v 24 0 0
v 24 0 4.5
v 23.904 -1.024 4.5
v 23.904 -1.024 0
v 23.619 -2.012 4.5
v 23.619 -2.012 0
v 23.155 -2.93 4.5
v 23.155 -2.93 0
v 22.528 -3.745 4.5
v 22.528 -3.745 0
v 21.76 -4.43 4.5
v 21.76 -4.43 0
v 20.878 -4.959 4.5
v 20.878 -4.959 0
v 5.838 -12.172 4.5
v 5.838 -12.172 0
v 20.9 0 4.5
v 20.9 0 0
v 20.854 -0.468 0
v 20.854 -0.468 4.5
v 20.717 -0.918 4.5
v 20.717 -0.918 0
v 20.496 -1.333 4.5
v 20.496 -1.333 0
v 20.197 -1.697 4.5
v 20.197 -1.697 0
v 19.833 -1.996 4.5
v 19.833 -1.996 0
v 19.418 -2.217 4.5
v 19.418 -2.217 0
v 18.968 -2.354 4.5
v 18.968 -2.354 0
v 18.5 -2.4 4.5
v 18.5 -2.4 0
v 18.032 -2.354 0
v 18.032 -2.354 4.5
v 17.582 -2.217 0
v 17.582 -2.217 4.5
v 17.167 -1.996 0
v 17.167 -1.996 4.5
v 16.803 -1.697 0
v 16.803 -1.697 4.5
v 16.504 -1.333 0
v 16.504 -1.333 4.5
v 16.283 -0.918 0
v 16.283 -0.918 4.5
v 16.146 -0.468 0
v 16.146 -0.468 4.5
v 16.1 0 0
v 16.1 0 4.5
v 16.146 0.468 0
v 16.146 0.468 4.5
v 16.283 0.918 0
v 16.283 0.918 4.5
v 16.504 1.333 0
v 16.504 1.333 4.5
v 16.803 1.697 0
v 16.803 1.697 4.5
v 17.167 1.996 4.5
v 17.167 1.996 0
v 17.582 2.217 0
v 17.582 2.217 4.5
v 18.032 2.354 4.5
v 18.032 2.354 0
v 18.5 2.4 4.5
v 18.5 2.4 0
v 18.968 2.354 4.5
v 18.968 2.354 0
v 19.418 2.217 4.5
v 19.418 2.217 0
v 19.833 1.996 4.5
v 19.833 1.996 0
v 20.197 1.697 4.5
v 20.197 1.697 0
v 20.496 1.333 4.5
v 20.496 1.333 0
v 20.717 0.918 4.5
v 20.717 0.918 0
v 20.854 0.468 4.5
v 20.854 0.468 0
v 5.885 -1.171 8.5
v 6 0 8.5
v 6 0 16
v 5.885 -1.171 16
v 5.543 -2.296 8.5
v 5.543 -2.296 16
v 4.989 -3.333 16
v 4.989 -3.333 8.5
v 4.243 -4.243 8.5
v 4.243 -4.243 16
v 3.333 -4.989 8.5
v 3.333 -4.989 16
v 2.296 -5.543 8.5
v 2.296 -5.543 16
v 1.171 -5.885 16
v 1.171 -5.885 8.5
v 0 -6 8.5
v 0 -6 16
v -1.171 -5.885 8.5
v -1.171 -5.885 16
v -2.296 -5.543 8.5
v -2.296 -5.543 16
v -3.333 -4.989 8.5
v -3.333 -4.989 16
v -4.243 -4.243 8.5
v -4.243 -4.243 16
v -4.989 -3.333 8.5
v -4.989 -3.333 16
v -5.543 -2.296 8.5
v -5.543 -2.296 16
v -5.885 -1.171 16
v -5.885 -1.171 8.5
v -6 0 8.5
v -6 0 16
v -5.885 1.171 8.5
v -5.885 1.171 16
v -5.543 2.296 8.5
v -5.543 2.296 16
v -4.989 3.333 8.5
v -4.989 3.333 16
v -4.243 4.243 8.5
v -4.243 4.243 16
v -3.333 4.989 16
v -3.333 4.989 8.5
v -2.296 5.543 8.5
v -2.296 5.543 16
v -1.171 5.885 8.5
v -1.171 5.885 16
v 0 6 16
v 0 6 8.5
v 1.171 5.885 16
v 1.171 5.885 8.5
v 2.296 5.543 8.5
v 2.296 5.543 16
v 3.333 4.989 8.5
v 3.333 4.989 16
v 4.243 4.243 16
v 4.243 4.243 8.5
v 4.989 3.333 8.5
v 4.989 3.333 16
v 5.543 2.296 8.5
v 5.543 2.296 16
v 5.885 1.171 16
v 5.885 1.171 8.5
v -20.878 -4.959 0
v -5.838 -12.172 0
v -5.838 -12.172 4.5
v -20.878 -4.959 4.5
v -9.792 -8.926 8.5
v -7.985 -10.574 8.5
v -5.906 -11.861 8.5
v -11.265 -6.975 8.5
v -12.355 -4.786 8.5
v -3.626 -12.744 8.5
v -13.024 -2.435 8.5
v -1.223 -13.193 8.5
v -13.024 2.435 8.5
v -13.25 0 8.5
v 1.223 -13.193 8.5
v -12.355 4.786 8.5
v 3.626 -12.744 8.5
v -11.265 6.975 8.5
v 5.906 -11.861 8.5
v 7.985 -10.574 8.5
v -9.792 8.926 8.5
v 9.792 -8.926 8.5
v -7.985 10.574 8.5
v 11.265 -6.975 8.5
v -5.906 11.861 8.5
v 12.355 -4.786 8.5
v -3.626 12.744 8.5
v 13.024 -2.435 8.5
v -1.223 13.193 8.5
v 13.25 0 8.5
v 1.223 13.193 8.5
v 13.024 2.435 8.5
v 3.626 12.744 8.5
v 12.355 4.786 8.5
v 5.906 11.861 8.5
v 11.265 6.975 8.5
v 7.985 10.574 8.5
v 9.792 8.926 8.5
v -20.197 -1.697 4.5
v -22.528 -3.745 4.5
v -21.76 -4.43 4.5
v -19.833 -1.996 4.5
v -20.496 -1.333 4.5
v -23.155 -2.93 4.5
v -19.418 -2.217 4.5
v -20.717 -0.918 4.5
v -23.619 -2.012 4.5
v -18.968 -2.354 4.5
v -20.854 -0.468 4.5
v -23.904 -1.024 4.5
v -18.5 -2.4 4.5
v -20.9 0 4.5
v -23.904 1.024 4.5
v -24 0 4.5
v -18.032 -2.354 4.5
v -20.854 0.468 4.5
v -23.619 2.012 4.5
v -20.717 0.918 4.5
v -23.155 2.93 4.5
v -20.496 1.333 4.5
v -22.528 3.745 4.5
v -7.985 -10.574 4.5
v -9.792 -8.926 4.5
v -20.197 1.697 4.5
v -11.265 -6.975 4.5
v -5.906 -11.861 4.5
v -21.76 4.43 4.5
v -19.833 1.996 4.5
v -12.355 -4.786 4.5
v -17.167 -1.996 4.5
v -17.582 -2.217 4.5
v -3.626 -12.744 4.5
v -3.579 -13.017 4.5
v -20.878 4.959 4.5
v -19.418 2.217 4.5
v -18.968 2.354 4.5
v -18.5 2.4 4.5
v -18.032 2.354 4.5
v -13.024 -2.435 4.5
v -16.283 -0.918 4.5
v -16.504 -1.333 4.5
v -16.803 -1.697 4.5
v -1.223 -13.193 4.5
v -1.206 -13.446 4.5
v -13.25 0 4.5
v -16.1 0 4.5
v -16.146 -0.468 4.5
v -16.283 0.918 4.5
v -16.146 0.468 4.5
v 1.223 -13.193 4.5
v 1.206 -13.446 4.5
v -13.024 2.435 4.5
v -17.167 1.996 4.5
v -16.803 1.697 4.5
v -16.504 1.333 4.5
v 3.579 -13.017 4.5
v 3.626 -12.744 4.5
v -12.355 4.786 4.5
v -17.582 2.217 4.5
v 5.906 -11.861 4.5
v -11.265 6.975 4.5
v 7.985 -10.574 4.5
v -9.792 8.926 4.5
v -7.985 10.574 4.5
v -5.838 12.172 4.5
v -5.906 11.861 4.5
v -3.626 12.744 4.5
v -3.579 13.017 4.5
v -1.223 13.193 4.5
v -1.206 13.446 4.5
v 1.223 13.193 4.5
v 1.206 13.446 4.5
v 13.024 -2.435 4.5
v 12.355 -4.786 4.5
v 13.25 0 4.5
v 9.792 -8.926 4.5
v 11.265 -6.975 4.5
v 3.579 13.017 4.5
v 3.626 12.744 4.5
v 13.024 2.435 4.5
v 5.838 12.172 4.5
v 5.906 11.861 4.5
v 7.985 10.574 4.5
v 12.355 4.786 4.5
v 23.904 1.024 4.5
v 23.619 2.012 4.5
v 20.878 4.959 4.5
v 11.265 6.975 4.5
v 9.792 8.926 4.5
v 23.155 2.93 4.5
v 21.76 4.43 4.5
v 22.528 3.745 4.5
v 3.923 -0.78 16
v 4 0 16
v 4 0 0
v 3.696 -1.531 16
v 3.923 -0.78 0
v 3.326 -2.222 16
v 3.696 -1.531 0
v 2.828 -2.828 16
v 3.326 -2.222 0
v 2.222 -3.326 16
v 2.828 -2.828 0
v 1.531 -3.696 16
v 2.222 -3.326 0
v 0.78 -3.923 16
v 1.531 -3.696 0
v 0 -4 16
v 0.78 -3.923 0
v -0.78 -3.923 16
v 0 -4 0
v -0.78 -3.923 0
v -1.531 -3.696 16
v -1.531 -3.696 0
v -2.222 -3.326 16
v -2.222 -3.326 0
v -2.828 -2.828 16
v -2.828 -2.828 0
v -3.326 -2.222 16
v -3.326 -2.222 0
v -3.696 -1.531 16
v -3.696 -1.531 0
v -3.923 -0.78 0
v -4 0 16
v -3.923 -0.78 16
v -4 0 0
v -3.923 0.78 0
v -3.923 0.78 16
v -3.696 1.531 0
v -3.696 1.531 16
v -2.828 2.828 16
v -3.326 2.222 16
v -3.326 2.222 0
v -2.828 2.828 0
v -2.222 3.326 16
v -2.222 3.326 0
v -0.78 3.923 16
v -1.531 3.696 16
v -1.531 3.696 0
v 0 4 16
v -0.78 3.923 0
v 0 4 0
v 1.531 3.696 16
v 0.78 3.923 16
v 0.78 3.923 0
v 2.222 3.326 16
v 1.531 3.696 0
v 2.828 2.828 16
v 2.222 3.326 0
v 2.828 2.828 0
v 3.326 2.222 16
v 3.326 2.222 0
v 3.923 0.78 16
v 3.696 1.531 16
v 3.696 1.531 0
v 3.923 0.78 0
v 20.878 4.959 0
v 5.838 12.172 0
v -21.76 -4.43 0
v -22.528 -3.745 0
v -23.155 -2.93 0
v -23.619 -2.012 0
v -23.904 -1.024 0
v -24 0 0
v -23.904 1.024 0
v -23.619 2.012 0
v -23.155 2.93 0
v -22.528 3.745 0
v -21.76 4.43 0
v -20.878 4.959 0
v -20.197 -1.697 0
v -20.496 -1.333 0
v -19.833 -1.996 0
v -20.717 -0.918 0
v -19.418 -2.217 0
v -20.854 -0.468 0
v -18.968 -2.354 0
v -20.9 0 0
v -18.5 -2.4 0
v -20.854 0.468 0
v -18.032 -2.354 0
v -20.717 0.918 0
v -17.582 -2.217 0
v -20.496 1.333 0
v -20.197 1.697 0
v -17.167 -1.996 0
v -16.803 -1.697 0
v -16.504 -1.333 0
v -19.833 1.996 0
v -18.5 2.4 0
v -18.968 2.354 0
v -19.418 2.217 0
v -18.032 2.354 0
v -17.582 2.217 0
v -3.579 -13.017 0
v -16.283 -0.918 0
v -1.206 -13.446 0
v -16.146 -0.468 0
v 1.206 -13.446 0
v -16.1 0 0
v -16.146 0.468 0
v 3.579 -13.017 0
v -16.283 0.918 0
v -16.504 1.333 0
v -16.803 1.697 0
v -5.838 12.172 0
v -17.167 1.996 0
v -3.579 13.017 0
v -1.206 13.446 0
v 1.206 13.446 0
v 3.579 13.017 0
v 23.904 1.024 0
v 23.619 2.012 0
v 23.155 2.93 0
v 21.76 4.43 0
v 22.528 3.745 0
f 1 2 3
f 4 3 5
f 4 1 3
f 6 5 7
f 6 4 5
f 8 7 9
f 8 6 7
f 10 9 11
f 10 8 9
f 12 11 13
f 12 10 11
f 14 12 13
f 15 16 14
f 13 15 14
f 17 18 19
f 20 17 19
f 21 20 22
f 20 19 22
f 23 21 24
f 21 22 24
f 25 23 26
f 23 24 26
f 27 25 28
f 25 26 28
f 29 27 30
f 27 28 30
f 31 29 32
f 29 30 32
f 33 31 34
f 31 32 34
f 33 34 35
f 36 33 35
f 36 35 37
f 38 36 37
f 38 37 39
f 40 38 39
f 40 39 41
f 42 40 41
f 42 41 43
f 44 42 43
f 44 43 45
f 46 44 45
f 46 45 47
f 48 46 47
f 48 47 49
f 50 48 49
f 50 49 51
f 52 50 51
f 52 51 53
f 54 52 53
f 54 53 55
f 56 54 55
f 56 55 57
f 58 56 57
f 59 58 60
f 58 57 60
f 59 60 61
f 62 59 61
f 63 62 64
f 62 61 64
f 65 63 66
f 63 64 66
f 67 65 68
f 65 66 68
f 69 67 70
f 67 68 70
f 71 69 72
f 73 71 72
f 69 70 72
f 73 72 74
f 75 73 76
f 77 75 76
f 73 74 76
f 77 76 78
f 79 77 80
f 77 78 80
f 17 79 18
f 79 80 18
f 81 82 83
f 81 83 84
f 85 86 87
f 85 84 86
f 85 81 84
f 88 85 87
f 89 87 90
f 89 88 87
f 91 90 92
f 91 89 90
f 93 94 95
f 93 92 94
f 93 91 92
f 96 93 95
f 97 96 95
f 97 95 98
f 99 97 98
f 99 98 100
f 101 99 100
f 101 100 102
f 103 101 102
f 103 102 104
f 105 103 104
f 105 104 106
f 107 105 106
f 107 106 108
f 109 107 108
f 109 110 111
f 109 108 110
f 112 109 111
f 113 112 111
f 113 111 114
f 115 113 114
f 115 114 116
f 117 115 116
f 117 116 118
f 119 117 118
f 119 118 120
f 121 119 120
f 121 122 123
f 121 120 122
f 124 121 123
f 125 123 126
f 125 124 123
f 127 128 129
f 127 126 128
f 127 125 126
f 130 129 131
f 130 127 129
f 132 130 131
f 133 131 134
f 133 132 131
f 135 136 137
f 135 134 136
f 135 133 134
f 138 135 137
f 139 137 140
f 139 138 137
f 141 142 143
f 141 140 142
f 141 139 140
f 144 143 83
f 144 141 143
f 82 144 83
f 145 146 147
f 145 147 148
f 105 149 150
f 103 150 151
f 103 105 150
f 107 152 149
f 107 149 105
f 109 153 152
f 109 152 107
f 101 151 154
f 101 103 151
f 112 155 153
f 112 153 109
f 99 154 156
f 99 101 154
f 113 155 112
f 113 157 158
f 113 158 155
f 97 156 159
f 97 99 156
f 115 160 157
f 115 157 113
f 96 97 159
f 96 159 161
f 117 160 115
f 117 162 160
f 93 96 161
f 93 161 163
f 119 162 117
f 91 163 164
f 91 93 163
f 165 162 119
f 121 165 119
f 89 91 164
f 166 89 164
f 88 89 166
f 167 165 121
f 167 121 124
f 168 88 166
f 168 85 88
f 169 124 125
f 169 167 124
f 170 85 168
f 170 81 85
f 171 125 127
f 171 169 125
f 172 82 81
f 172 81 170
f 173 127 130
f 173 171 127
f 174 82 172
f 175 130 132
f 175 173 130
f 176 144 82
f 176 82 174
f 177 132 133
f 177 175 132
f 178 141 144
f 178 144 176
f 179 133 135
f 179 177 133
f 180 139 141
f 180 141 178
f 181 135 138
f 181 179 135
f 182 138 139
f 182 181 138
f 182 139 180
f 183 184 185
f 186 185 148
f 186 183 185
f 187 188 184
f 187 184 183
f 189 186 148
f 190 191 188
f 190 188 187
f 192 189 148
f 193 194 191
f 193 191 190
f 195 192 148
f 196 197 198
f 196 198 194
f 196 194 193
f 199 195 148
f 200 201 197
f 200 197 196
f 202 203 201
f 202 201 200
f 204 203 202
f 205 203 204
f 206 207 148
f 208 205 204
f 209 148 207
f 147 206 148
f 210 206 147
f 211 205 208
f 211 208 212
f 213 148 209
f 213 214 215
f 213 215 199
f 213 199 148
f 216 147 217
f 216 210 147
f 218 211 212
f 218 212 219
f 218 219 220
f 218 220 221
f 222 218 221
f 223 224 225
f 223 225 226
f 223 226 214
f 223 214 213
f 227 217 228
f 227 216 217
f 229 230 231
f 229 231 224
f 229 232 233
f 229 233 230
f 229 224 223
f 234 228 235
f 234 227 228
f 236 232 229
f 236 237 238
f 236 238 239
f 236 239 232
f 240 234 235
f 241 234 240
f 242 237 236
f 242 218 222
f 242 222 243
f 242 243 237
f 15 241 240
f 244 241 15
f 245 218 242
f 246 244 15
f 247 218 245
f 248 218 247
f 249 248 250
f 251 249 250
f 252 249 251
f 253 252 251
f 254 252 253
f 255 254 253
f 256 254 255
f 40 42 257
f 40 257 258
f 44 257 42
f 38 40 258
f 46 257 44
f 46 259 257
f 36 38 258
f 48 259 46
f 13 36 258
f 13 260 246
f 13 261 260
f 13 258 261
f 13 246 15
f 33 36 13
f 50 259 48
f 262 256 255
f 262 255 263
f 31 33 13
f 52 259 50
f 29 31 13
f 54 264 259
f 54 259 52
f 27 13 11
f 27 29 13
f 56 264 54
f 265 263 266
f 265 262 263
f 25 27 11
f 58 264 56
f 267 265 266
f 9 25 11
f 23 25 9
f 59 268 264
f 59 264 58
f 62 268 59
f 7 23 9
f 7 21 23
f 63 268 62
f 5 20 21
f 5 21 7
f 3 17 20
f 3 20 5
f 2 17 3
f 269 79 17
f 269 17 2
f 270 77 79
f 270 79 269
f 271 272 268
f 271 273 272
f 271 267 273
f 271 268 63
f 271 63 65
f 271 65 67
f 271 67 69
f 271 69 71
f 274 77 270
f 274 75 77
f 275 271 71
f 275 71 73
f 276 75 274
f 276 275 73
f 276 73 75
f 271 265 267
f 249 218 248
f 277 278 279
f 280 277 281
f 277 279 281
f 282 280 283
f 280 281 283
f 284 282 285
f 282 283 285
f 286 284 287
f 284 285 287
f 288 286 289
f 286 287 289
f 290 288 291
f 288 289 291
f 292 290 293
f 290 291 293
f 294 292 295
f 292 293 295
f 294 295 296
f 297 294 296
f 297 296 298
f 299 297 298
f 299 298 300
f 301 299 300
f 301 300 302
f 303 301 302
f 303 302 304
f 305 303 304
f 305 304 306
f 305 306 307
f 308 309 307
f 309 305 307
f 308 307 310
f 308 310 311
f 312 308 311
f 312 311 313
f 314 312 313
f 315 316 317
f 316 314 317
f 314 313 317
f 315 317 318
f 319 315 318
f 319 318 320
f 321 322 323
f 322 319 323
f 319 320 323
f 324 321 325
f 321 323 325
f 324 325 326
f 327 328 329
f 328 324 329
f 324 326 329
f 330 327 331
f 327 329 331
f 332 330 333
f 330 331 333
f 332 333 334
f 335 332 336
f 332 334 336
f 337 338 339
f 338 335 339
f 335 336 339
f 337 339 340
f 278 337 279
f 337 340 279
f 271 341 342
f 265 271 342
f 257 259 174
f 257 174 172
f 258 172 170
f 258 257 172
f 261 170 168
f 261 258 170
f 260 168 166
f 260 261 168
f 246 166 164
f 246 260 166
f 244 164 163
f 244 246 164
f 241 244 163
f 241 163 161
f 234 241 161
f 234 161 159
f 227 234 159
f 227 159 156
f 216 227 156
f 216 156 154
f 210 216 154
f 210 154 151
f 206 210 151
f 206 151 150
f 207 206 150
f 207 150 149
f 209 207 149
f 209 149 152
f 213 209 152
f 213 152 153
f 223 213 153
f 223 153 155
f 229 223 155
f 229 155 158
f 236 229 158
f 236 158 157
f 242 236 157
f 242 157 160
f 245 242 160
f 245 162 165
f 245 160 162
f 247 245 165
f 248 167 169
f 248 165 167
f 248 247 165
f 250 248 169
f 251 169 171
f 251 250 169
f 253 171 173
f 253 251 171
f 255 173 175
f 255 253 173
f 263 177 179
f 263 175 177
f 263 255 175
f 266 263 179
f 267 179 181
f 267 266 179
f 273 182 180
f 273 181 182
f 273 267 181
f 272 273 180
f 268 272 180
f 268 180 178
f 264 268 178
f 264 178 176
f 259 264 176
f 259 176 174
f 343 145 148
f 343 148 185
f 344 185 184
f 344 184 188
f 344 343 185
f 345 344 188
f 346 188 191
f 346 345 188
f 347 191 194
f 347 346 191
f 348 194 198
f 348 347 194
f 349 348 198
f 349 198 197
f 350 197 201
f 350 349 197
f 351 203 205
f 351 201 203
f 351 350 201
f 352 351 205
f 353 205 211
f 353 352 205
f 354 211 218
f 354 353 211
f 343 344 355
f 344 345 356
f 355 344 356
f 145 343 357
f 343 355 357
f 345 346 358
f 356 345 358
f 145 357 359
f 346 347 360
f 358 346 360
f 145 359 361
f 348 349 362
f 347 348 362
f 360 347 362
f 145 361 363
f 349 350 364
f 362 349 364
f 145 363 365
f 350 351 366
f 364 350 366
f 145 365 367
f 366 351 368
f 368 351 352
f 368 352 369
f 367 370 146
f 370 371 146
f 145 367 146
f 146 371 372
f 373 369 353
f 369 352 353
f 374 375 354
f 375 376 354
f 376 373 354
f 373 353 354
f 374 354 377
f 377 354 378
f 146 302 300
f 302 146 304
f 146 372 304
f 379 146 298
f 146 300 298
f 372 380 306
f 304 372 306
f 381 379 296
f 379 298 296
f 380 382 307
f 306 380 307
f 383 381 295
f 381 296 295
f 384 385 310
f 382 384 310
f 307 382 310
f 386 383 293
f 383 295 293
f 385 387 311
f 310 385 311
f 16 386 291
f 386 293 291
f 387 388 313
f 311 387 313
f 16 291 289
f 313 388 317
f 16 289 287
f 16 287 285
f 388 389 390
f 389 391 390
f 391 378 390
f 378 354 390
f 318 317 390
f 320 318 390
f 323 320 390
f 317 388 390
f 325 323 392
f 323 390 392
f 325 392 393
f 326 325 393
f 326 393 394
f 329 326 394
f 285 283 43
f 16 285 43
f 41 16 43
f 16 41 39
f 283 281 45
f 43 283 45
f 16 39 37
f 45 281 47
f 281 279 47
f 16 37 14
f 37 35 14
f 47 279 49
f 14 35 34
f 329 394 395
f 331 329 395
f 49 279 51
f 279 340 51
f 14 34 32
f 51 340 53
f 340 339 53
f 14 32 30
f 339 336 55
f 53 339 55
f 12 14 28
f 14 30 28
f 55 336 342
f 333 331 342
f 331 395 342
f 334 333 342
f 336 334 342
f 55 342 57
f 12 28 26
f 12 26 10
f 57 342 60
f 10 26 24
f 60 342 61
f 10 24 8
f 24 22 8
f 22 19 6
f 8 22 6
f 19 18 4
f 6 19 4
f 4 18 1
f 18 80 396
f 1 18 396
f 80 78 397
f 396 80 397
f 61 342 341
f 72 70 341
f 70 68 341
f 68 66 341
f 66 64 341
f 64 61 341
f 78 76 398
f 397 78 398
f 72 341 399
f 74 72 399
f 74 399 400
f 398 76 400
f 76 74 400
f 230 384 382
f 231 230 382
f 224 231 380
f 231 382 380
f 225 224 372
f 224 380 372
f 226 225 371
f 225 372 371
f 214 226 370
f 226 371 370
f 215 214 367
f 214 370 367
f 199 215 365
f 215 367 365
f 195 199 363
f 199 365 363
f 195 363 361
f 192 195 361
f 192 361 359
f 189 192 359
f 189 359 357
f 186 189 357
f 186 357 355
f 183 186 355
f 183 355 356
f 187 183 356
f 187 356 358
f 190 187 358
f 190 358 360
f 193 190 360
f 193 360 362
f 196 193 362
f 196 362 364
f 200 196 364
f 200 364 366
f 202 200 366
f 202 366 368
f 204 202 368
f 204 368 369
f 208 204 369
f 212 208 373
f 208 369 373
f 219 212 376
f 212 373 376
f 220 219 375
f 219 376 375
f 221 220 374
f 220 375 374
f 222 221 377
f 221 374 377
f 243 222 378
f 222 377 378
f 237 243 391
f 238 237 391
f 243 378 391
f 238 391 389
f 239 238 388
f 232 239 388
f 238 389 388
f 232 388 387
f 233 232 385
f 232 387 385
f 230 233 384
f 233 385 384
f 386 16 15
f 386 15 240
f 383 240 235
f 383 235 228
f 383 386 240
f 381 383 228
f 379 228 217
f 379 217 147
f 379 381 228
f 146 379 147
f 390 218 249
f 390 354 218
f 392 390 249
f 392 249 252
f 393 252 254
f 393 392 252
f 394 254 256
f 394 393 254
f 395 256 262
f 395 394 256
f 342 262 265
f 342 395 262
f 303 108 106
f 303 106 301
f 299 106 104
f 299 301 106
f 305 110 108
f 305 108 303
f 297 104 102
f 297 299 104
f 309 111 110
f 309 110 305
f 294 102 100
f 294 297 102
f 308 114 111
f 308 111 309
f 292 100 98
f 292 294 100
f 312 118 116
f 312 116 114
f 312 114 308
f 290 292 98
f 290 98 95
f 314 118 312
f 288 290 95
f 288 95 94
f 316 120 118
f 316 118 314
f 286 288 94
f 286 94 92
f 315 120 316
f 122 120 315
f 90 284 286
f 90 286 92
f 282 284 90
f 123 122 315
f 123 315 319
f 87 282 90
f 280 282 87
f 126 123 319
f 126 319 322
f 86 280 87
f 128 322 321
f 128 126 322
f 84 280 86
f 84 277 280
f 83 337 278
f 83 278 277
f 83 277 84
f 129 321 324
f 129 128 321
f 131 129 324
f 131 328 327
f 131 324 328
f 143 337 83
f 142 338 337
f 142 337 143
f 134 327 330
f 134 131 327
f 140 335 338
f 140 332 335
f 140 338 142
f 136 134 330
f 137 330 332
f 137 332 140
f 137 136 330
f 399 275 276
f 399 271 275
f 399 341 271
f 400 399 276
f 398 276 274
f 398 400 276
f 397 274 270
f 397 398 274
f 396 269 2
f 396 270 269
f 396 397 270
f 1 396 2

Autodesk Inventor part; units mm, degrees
ref_plane "YZ Plane" through (0, 0, 0) normal (1, 0, 0) x (0, 1, 0)
ref_plane "XZ Plane" through (0, 0, 0) normal (0, 1, 0) x (-1, 0, 0)
ref_plane "XY Plane" through (0, 0, 0) normal (0, 0, 1) x (1, 0, 0)
sketch "Эскиз1" plane through (0, 0, 0) normal (0, 0, 1) x (1, 0, 0)
  arc A0 (4, 0) -> (-4, 0) centre (0, 0) ccw
  arc A1 (-16.1, 0) -> (-20.9, 0) centre (-18.5, 0) ccw
  arc A2 (20.9, 0) -> (16.1, 0) centre (18.5, 0) ccw
  line L0 (-24, 0) -> (24, 0)
  line L1 (-20.8784, 4.9592) -> (-5.8378, 12.1725)
  line L2 (20.8784, 4.9592) -> (5.8378, 12.1725)
  arc A3 (-20.8784, 4.9592) -> (-24, 0) centre (-18.5, 0) ccw
  arc A4 (24, 0) -> (20.8784, 4.9592) centre (18.5, 0) ccw
  arc A5 (5.8378, 12.1725) -> (-5.8378, 12.1725) centre (0, 0) ccw
  dimension "d0" = 8
  dimension "d9" = 37
  dimension "d12" = 4.8
  dimension "d14" = 48
  dimension "d15" = 5.5
  dimension "d16" = 13.5
  dimension "d19" = 0
extrude "Выдавливание1" add sketch "Эскиз1" along normal blind 4.5 contours A0 L0 A1 A3 L1 A5 L2 A4 A2
mirror "Зеркальное отражение1" about plane through (-24, 0, 0) normal (0, -1, 0) of "Выдавливание1"
sketch "Эскиз2" plane through (0, 0, 4.5) normal (0, 0, 1) x (1, 0, 0)
  circle A0 centre (0, 0) radius 4
  circle A1 centre (0, 0) radius 13.25
  dimension "d23" = 8
  dimension "d24" = 26.5
extrude "Выдавливание2" add sketch "Эскиз2" along normal blind 4
sketch "Эскиз5" plane through (0, 0, 8.5) normal (0, 0, 1) x (1, 0, 0)
  circle A0 centre (0, 0) radius 6
  circle A1 centre (0, 0) radius 4
  dimension "d33" = 12
  dimension "d34" = 8
extrude "Выдавливание5" add sketch "Эскиз5" along normal blind 7.5
properties part number "KFL08"
